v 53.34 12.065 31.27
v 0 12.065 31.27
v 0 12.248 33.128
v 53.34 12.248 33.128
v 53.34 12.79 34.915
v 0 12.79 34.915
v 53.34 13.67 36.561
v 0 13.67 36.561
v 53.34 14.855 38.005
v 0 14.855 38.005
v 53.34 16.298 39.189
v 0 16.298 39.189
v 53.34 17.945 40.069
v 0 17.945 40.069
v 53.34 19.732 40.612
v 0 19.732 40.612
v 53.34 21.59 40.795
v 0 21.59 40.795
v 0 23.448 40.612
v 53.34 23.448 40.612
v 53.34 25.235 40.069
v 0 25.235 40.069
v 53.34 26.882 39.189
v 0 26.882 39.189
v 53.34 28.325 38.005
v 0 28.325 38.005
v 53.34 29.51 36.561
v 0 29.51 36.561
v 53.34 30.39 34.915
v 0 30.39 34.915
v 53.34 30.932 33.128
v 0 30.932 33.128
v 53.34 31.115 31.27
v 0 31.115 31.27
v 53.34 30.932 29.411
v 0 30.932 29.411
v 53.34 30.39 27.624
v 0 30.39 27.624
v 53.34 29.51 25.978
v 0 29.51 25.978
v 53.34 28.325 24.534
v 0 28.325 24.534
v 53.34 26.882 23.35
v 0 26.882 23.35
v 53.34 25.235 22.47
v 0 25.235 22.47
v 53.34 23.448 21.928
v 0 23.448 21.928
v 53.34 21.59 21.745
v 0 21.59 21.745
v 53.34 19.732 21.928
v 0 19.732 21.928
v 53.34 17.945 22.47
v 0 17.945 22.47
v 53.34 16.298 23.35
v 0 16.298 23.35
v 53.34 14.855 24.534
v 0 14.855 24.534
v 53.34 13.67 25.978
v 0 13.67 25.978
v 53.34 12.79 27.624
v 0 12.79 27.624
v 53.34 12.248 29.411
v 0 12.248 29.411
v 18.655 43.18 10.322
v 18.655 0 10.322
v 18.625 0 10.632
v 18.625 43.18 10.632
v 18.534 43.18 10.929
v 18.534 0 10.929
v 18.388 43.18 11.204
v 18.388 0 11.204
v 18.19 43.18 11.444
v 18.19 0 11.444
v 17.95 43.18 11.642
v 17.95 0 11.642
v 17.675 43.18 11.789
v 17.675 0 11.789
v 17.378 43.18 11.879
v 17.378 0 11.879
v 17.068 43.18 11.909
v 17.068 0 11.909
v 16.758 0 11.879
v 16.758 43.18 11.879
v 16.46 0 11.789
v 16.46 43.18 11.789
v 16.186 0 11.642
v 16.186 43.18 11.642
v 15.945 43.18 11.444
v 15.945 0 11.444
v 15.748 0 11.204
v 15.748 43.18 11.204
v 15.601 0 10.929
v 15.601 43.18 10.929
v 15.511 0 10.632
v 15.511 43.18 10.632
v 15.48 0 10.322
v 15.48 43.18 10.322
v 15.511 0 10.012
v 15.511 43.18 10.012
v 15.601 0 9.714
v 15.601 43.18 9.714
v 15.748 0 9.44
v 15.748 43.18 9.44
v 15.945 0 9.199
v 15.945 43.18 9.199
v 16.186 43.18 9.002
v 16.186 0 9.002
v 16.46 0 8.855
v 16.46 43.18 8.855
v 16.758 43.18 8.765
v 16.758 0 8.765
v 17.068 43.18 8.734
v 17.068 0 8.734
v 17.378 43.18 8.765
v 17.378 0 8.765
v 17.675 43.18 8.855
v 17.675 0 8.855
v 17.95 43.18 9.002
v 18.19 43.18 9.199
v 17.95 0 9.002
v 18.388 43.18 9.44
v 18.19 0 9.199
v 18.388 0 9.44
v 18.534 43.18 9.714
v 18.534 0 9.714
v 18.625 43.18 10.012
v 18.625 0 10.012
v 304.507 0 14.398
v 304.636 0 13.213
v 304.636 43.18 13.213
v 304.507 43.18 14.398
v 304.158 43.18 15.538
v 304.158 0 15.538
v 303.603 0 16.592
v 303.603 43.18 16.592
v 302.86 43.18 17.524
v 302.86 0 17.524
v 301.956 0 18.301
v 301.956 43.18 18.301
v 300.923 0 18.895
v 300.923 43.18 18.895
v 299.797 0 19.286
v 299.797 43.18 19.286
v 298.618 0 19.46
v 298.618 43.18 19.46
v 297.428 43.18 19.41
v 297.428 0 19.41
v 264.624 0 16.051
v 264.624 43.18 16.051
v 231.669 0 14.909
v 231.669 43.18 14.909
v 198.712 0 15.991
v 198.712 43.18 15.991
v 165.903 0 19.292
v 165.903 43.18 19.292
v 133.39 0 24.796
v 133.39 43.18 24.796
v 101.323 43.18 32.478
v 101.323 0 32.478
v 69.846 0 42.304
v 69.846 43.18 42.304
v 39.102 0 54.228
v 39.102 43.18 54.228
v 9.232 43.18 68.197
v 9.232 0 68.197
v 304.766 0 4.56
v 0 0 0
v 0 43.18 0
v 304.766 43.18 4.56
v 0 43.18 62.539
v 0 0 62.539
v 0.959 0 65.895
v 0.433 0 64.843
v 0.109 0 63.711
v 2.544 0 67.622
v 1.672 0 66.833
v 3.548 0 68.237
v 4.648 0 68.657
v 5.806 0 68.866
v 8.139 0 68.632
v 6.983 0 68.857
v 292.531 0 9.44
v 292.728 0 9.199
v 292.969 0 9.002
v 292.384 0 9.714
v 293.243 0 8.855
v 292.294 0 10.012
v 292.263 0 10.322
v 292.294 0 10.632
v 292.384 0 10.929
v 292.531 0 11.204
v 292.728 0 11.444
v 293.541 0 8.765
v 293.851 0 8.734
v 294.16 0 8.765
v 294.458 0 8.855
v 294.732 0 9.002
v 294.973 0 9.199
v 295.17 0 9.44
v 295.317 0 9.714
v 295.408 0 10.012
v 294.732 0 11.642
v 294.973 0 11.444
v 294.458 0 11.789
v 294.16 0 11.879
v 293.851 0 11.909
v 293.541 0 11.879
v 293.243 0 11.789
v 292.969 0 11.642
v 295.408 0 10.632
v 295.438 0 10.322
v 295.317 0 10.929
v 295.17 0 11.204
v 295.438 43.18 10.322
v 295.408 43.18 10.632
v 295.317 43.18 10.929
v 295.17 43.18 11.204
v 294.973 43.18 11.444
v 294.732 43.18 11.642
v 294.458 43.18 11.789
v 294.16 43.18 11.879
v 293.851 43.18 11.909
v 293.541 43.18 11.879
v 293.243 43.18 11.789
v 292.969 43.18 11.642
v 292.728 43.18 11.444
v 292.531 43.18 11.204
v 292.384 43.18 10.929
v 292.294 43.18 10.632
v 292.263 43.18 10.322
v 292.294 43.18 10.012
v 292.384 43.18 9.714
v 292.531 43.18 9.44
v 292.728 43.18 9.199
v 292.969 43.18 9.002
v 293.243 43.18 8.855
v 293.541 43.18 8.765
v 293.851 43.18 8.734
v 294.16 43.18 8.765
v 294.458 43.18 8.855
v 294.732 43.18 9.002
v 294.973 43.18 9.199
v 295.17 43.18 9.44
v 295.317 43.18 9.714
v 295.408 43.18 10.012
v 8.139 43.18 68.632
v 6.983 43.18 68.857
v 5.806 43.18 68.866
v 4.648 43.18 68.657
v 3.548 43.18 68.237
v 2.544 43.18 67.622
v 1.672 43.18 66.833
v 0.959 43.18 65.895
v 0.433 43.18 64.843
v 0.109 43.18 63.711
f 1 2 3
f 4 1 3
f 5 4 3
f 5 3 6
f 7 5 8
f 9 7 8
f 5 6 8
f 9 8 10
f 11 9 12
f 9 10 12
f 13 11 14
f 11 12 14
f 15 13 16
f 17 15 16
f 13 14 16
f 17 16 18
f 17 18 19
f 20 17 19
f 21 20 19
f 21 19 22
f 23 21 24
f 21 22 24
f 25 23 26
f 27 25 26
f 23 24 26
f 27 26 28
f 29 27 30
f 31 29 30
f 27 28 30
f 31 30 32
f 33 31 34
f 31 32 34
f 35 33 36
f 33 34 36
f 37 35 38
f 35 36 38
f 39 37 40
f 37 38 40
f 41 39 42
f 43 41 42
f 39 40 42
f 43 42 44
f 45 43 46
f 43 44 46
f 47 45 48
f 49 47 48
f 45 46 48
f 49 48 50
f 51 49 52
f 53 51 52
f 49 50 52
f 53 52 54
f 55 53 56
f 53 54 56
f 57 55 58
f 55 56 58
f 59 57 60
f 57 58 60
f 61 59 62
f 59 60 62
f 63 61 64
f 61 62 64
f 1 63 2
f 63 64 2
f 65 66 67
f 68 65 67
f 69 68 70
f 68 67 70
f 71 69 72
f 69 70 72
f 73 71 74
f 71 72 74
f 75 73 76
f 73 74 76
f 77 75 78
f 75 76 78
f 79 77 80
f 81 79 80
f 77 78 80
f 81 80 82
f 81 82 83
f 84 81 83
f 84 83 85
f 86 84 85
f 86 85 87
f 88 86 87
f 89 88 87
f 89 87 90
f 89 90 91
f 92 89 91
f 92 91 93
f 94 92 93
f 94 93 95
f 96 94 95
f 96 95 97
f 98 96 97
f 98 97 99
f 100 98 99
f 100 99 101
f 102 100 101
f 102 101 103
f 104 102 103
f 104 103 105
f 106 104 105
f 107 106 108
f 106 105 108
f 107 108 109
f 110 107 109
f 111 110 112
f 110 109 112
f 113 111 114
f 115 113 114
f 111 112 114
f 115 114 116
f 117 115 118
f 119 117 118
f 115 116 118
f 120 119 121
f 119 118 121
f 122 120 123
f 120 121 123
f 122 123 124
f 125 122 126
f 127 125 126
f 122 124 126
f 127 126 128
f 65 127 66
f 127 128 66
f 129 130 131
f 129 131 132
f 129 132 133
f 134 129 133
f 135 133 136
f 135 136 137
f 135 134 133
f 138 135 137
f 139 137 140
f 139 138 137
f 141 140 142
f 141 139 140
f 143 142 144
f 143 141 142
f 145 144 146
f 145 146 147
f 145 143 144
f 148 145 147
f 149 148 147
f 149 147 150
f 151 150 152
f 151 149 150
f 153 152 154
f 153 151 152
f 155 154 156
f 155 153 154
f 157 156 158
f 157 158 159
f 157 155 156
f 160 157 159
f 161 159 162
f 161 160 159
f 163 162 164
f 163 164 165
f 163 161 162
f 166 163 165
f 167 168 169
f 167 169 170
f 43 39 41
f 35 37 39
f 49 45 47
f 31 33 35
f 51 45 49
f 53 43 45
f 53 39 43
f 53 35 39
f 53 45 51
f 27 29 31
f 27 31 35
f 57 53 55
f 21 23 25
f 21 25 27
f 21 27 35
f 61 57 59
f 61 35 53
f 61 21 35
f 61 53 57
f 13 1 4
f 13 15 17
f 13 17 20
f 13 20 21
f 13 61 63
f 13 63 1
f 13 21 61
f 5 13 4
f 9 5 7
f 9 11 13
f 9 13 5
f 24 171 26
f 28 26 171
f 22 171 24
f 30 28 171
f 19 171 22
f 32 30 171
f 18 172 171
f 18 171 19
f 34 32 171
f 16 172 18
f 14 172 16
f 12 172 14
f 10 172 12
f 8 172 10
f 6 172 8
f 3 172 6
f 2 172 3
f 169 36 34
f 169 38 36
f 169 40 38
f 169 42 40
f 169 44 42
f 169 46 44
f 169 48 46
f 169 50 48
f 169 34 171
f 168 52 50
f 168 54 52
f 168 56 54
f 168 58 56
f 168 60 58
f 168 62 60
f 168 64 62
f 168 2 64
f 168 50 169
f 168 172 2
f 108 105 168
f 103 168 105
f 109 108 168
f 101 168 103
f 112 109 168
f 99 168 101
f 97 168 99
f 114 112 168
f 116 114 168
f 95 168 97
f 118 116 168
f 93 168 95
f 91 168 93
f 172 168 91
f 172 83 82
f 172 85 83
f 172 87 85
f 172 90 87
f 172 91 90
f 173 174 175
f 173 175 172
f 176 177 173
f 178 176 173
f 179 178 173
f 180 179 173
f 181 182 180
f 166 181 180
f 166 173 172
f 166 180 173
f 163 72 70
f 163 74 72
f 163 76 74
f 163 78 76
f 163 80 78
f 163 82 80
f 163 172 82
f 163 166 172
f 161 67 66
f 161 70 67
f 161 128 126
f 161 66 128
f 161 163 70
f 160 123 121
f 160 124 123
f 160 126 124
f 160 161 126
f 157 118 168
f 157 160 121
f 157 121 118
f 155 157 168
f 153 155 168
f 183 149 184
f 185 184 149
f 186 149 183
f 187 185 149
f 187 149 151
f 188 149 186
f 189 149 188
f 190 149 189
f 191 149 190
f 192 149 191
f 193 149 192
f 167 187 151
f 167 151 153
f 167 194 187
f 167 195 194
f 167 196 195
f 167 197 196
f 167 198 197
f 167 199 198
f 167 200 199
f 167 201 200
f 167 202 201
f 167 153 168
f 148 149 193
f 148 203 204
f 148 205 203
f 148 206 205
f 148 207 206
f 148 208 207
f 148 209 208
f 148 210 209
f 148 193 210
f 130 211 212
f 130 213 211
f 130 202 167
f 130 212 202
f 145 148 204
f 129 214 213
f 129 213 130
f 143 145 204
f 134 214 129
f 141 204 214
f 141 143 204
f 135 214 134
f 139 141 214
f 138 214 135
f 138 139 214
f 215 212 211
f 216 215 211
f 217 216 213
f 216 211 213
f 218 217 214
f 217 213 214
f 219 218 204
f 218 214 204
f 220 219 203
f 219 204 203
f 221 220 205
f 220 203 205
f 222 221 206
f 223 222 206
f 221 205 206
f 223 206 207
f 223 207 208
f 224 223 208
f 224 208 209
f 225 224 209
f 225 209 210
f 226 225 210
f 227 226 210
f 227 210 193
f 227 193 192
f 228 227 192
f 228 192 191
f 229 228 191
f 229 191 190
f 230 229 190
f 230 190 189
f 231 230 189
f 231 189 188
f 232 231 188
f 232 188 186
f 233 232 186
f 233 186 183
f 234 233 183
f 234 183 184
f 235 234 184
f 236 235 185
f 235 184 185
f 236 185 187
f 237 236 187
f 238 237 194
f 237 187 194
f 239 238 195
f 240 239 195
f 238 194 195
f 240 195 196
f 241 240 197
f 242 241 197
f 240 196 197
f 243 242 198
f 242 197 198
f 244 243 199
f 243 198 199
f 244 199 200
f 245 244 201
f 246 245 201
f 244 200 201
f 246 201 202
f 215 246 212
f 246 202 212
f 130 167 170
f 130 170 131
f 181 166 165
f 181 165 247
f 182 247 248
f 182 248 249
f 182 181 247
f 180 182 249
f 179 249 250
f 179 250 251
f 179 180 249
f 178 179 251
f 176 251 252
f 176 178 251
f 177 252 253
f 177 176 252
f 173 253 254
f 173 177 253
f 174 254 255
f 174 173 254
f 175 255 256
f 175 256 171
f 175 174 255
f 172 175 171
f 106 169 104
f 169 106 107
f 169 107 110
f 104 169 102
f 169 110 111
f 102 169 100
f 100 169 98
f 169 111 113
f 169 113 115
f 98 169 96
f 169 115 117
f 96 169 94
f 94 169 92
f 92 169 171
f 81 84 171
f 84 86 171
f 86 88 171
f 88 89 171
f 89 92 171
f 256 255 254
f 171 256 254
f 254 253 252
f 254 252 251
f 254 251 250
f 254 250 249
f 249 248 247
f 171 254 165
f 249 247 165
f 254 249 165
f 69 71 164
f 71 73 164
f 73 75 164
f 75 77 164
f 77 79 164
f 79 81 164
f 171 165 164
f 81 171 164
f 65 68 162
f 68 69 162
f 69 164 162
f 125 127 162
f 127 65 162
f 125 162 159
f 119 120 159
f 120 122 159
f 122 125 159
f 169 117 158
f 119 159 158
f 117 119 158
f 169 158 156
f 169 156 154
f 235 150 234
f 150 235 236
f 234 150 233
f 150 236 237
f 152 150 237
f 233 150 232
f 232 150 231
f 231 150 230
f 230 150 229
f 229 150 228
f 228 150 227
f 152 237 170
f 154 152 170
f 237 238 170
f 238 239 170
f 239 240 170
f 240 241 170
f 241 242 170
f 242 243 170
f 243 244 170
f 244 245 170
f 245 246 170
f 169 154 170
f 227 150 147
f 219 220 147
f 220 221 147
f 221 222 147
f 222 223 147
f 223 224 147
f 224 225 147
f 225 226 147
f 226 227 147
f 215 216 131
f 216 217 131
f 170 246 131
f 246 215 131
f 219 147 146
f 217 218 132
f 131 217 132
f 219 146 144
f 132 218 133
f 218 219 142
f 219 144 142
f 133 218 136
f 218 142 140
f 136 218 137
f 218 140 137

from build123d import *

# Parameters (mm, degrees)
F1_DEPTH = 43.18
F3_R     = 9.525
F4_DEPTH = 53.34
F5_R     = 1.5875
F6_DEPTH = 57.15


with BuildPart() as f1:
    # F0 (on Front) → F1 (new body)
    with BuildSketch(Plane.XZ):
        with BuildLine():
            Line((0, 62.539058), (0, 0))
            Line((0, 0), (304.765889, 4.559934))
            Line((304.765889, 4.559934), (304.636415, 13.213416))
            ThreePointArc((304.636415, 13.213416), (302.426417, 17.933889), (297.427606, 19.409977))
            ThreePointArc((297.427606, 19.409977), (149.599987, 21.769594), (9.232421, 68.197163))
            ThreePointArc((9.232421, 68.197163), (3.031934, 67.953201), (0, 62.539058))
        make_face()
    extrude(amount=-F1_DEPTH)

    # F3 (on face) → F4 (cut)
    with BuildSketch(Plane(origin=(0, 0, 0), x_dir=(0, -1, 0), z_dir=(-1, 0, 0))):
        with Locations((-21.59, 31.269529)):
            Circle(F3_R)
    extrude(amount=-F4_DEPTH, mode=Mode.SUBTRACT)

    # F5 (on face) → F6 (cut)
    with BuildSketch(Plane.XZ):
        with Locations((17.067824, 10.321916)):
            Circle(F5_R)
        with Locations((293.850511, 10.321916)):
            Circle(F5_R)
    extrude(amount=-F6_DEPTH, mode=Mode.SUBTRACT)


solid = f1.part
